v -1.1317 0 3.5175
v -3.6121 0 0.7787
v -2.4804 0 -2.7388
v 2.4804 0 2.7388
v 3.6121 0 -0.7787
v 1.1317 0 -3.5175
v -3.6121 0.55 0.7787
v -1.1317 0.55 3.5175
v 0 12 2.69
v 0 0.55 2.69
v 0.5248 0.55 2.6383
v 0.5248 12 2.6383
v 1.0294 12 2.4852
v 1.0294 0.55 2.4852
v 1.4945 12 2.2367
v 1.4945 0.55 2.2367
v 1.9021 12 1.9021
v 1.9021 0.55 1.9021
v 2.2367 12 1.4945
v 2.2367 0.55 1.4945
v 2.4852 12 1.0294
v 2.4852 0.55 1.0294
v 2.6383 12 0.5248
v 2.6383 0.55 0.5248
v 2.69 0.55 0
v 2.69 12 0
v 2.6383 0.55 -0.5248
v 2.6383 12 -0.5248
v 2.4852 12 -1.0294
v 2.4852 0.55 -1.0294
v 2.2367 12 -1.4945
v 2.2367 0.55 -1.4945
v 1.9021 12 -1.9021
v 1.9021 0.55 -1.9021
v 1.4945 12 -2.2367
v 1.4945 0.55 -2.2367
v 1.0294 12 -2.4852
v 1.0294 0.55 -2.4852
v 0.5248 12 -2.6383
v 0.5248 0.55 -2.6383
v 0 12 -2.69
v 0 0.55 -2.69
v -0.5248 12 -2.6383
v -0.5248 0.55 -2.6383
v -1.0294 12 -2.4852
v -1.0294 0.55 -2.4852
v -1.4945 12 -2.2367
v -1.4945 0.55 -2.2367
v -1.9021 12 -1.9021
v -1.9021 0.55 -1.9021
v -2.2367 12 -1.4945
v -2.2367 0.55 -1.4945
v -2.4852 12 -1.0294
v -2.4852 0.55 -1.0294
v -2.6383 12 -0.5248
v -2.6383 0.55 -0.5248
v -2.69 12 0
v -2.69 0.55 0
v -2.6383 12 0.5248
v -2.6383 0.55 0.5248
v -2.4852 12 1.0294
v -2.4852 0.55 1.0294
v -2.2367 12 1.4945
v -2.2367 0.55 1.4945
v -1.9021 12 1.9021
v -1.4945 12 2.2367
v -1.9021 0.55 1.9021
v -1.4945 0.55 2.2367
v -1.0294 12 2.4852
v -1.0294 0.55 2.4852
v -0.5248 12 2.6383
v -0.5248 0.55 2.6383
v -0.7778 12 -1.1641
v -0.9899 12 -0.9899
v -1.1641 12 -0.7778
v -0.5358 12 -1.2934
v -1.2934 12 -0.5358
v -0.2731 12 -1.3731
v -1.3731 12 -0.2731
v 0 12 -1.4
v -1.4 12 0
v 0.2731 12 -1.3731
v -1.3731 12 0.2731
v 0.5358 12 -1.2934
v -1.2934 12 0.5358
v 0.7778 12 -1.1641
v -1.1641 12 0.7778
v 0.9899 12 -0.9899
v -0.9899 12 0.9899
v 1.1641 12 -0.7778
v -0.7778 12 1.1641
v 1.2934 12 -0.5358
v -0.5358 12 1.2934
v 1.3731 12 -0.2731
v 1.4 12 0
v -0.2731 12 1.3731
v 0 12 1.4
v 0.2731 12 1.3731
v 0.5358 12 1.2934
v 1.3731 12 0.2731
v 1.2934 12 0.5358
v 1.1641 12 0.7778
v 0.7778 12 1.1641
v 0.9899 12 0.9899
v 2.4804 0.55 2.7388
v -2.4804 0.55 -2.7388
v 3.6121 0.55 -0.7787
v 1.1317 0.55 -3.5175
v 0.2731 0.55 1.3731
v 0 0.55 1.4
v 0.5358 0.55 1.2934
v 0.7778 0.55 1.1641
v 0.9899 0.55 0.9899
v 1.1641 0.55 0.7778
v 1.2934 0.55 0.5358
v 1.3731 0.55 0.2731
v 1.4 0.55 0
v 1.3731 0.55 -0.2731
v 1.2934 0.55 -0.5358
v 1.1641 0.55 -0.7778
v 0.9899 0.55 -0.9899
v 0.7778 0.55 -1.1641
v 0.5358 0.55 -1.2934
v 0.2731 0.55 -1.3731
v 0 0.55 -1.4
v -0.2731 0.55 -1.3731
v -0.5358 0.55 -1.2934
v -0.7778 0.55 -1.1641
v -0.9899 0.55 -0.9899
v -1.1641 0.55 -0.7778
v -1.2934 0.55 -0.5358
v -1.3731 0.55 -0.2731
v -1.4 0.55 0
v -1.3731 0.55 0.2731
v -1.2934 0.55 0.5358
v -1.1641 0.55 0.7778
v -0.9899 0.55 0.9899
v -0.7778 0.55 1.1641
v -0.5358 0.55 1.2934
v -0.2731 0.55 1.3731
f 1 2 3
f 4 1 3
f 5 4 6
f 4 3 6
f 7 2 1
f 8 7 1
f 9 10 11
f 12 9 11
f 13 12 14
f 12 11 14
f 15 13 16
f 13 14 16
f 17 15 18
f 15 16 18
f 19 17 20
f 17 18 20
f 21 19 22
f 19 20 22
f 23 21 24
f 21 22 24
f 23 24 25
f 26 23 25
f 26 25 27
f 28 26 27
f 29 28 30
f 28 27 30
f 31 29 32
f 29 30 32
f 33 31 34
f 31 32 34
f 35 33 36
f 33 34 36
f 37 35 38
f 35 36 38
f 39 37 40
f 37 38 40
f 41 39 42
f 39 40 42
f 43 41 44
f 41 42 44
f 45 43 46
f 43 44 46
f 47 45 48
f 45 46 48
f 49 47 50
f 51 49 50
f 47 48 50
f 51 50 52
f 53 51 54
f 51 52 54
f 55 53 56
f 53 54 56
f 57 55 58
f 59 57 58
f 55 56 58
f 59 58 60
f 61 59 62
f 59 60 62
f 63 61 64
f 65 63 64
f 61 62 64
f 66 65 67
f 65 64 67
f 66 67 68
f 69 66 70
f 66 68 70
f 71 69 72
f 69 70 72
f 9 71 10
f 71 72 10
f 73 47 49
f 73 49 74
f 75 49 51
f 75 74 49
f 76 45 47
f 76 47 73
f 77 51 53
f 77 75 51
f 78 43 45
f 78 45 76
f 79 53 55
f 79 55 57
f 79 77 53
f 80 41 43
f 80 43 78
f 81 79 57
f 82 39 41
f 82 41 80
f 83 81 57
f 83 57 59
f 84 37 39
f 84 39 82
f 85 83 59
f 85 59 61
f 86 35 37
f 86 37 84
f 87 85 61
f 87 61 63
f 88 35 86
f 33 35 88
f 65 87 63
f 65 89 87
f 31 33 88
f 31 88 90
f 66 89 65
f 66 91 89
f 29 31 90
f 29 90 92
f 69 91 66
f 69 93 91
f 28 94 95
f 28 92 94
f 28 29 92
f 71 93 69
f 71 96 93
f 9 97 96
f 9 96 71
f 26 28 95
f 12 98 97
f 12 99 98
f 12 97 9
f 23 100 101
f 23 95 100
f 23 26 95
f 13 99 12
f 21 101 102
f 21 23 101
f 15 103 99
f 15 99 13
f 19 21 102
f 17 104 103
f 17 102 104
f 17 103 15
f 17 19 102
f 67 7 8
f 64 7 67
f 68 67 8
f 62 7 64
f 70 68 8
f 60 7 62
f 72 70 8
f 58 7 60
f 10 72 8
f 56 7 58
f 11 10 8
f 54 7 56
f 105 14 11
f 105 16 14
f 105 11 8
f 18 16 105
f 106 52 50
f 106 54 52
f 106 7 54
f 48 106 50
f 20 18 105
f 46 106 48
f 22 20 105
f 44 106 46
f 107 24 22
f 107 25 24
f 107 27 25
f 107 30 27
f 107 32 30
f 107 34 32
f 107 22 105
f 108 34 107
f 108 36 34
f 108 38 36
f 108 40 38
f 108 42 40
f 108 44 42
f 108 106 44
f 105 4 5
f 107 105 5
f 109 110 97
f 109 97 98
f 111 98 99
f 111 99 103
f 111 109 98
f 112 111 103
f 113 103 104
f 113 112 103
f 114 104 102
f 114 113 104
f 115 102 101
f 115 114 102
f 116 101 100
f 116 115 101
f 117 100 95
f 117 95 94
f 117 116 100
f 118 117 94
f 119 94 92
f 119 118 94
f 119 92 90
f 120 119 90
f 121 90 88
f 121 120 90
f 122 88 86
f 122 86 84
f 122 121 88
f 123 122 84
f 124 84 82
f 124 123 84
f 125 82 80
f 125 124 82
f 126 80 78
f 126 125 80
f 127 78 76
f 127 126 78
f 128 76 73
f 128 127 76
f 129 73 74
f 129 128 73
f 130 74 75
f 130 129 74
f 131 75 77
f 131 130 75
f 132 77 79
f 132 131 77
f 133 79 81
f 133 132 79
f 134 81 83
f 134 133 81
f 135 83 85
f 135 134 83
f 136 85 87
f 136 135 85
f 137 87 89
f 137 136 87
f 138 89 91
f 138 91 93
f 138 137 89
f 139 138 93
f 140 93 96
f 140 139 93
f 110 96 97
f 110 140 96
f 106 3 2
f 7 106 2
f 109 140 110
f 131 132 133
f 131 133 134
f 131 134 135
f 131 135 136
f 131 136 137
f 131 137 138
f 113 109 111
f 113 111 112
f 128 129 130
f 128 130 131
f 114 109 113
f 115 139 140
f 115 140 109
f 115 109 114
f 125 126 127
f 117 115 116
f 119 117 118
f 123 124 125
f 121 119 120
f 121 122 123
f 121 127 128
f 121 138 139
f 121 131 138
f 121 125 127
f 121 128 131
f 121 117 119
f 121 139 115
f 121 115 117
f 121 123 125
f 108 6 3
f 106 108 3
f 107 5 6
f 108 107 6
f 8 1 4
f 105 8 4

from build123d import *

# Parameters (mm, degrees)
RESSALTO_EXTRUS_O1_DEPTH = 0.55
ESBO_O2_R                = 2.69
ESBO_O2_R_2              = 1.4
RESSALTO_EXTRUS_O2_DEPTH = 11.45


with BuildPart() as part:
    # Esboço1 → Ressalto-extrusão1 (new body)
    with BuildSketch(Plane(origin=(0, 0, 0), x_dir=(1, 0, 0), z_dir=(0, 1, 0))):
        Polygon((2.480405511, -2.738781085), (3.612056751, 0.778703642), (1.13165124, 3.517484727), (-2.480405511, 2.738781085), (-3.612056751, -0.778703642), (-1.13165124, -3.517484727), align=None)
    extrude(amount=RESSALTO_EXTRUS_O1_DEPTH)

    # Esboço2 → Ressalto-extrusão2 (add)
    with BuildSketch(Plane(origin=(0, 0.55, 0), x_dir=(1, 0, 0), z_dir=(0, 1, 0))):
        with Locations(Location((0, 0, 0), (0, 0, 270))):
            Circle(ESBO_O2_R)
        with Locations(Location((0, 0, 0), (0, 0, 270))):
            Circle(ESBO_O2_R_2, mode=Mode.SUBTRACT)
    extrude(amount=RESSALTO_EXTRUS_O2_DEPTH)


solid = part.part
